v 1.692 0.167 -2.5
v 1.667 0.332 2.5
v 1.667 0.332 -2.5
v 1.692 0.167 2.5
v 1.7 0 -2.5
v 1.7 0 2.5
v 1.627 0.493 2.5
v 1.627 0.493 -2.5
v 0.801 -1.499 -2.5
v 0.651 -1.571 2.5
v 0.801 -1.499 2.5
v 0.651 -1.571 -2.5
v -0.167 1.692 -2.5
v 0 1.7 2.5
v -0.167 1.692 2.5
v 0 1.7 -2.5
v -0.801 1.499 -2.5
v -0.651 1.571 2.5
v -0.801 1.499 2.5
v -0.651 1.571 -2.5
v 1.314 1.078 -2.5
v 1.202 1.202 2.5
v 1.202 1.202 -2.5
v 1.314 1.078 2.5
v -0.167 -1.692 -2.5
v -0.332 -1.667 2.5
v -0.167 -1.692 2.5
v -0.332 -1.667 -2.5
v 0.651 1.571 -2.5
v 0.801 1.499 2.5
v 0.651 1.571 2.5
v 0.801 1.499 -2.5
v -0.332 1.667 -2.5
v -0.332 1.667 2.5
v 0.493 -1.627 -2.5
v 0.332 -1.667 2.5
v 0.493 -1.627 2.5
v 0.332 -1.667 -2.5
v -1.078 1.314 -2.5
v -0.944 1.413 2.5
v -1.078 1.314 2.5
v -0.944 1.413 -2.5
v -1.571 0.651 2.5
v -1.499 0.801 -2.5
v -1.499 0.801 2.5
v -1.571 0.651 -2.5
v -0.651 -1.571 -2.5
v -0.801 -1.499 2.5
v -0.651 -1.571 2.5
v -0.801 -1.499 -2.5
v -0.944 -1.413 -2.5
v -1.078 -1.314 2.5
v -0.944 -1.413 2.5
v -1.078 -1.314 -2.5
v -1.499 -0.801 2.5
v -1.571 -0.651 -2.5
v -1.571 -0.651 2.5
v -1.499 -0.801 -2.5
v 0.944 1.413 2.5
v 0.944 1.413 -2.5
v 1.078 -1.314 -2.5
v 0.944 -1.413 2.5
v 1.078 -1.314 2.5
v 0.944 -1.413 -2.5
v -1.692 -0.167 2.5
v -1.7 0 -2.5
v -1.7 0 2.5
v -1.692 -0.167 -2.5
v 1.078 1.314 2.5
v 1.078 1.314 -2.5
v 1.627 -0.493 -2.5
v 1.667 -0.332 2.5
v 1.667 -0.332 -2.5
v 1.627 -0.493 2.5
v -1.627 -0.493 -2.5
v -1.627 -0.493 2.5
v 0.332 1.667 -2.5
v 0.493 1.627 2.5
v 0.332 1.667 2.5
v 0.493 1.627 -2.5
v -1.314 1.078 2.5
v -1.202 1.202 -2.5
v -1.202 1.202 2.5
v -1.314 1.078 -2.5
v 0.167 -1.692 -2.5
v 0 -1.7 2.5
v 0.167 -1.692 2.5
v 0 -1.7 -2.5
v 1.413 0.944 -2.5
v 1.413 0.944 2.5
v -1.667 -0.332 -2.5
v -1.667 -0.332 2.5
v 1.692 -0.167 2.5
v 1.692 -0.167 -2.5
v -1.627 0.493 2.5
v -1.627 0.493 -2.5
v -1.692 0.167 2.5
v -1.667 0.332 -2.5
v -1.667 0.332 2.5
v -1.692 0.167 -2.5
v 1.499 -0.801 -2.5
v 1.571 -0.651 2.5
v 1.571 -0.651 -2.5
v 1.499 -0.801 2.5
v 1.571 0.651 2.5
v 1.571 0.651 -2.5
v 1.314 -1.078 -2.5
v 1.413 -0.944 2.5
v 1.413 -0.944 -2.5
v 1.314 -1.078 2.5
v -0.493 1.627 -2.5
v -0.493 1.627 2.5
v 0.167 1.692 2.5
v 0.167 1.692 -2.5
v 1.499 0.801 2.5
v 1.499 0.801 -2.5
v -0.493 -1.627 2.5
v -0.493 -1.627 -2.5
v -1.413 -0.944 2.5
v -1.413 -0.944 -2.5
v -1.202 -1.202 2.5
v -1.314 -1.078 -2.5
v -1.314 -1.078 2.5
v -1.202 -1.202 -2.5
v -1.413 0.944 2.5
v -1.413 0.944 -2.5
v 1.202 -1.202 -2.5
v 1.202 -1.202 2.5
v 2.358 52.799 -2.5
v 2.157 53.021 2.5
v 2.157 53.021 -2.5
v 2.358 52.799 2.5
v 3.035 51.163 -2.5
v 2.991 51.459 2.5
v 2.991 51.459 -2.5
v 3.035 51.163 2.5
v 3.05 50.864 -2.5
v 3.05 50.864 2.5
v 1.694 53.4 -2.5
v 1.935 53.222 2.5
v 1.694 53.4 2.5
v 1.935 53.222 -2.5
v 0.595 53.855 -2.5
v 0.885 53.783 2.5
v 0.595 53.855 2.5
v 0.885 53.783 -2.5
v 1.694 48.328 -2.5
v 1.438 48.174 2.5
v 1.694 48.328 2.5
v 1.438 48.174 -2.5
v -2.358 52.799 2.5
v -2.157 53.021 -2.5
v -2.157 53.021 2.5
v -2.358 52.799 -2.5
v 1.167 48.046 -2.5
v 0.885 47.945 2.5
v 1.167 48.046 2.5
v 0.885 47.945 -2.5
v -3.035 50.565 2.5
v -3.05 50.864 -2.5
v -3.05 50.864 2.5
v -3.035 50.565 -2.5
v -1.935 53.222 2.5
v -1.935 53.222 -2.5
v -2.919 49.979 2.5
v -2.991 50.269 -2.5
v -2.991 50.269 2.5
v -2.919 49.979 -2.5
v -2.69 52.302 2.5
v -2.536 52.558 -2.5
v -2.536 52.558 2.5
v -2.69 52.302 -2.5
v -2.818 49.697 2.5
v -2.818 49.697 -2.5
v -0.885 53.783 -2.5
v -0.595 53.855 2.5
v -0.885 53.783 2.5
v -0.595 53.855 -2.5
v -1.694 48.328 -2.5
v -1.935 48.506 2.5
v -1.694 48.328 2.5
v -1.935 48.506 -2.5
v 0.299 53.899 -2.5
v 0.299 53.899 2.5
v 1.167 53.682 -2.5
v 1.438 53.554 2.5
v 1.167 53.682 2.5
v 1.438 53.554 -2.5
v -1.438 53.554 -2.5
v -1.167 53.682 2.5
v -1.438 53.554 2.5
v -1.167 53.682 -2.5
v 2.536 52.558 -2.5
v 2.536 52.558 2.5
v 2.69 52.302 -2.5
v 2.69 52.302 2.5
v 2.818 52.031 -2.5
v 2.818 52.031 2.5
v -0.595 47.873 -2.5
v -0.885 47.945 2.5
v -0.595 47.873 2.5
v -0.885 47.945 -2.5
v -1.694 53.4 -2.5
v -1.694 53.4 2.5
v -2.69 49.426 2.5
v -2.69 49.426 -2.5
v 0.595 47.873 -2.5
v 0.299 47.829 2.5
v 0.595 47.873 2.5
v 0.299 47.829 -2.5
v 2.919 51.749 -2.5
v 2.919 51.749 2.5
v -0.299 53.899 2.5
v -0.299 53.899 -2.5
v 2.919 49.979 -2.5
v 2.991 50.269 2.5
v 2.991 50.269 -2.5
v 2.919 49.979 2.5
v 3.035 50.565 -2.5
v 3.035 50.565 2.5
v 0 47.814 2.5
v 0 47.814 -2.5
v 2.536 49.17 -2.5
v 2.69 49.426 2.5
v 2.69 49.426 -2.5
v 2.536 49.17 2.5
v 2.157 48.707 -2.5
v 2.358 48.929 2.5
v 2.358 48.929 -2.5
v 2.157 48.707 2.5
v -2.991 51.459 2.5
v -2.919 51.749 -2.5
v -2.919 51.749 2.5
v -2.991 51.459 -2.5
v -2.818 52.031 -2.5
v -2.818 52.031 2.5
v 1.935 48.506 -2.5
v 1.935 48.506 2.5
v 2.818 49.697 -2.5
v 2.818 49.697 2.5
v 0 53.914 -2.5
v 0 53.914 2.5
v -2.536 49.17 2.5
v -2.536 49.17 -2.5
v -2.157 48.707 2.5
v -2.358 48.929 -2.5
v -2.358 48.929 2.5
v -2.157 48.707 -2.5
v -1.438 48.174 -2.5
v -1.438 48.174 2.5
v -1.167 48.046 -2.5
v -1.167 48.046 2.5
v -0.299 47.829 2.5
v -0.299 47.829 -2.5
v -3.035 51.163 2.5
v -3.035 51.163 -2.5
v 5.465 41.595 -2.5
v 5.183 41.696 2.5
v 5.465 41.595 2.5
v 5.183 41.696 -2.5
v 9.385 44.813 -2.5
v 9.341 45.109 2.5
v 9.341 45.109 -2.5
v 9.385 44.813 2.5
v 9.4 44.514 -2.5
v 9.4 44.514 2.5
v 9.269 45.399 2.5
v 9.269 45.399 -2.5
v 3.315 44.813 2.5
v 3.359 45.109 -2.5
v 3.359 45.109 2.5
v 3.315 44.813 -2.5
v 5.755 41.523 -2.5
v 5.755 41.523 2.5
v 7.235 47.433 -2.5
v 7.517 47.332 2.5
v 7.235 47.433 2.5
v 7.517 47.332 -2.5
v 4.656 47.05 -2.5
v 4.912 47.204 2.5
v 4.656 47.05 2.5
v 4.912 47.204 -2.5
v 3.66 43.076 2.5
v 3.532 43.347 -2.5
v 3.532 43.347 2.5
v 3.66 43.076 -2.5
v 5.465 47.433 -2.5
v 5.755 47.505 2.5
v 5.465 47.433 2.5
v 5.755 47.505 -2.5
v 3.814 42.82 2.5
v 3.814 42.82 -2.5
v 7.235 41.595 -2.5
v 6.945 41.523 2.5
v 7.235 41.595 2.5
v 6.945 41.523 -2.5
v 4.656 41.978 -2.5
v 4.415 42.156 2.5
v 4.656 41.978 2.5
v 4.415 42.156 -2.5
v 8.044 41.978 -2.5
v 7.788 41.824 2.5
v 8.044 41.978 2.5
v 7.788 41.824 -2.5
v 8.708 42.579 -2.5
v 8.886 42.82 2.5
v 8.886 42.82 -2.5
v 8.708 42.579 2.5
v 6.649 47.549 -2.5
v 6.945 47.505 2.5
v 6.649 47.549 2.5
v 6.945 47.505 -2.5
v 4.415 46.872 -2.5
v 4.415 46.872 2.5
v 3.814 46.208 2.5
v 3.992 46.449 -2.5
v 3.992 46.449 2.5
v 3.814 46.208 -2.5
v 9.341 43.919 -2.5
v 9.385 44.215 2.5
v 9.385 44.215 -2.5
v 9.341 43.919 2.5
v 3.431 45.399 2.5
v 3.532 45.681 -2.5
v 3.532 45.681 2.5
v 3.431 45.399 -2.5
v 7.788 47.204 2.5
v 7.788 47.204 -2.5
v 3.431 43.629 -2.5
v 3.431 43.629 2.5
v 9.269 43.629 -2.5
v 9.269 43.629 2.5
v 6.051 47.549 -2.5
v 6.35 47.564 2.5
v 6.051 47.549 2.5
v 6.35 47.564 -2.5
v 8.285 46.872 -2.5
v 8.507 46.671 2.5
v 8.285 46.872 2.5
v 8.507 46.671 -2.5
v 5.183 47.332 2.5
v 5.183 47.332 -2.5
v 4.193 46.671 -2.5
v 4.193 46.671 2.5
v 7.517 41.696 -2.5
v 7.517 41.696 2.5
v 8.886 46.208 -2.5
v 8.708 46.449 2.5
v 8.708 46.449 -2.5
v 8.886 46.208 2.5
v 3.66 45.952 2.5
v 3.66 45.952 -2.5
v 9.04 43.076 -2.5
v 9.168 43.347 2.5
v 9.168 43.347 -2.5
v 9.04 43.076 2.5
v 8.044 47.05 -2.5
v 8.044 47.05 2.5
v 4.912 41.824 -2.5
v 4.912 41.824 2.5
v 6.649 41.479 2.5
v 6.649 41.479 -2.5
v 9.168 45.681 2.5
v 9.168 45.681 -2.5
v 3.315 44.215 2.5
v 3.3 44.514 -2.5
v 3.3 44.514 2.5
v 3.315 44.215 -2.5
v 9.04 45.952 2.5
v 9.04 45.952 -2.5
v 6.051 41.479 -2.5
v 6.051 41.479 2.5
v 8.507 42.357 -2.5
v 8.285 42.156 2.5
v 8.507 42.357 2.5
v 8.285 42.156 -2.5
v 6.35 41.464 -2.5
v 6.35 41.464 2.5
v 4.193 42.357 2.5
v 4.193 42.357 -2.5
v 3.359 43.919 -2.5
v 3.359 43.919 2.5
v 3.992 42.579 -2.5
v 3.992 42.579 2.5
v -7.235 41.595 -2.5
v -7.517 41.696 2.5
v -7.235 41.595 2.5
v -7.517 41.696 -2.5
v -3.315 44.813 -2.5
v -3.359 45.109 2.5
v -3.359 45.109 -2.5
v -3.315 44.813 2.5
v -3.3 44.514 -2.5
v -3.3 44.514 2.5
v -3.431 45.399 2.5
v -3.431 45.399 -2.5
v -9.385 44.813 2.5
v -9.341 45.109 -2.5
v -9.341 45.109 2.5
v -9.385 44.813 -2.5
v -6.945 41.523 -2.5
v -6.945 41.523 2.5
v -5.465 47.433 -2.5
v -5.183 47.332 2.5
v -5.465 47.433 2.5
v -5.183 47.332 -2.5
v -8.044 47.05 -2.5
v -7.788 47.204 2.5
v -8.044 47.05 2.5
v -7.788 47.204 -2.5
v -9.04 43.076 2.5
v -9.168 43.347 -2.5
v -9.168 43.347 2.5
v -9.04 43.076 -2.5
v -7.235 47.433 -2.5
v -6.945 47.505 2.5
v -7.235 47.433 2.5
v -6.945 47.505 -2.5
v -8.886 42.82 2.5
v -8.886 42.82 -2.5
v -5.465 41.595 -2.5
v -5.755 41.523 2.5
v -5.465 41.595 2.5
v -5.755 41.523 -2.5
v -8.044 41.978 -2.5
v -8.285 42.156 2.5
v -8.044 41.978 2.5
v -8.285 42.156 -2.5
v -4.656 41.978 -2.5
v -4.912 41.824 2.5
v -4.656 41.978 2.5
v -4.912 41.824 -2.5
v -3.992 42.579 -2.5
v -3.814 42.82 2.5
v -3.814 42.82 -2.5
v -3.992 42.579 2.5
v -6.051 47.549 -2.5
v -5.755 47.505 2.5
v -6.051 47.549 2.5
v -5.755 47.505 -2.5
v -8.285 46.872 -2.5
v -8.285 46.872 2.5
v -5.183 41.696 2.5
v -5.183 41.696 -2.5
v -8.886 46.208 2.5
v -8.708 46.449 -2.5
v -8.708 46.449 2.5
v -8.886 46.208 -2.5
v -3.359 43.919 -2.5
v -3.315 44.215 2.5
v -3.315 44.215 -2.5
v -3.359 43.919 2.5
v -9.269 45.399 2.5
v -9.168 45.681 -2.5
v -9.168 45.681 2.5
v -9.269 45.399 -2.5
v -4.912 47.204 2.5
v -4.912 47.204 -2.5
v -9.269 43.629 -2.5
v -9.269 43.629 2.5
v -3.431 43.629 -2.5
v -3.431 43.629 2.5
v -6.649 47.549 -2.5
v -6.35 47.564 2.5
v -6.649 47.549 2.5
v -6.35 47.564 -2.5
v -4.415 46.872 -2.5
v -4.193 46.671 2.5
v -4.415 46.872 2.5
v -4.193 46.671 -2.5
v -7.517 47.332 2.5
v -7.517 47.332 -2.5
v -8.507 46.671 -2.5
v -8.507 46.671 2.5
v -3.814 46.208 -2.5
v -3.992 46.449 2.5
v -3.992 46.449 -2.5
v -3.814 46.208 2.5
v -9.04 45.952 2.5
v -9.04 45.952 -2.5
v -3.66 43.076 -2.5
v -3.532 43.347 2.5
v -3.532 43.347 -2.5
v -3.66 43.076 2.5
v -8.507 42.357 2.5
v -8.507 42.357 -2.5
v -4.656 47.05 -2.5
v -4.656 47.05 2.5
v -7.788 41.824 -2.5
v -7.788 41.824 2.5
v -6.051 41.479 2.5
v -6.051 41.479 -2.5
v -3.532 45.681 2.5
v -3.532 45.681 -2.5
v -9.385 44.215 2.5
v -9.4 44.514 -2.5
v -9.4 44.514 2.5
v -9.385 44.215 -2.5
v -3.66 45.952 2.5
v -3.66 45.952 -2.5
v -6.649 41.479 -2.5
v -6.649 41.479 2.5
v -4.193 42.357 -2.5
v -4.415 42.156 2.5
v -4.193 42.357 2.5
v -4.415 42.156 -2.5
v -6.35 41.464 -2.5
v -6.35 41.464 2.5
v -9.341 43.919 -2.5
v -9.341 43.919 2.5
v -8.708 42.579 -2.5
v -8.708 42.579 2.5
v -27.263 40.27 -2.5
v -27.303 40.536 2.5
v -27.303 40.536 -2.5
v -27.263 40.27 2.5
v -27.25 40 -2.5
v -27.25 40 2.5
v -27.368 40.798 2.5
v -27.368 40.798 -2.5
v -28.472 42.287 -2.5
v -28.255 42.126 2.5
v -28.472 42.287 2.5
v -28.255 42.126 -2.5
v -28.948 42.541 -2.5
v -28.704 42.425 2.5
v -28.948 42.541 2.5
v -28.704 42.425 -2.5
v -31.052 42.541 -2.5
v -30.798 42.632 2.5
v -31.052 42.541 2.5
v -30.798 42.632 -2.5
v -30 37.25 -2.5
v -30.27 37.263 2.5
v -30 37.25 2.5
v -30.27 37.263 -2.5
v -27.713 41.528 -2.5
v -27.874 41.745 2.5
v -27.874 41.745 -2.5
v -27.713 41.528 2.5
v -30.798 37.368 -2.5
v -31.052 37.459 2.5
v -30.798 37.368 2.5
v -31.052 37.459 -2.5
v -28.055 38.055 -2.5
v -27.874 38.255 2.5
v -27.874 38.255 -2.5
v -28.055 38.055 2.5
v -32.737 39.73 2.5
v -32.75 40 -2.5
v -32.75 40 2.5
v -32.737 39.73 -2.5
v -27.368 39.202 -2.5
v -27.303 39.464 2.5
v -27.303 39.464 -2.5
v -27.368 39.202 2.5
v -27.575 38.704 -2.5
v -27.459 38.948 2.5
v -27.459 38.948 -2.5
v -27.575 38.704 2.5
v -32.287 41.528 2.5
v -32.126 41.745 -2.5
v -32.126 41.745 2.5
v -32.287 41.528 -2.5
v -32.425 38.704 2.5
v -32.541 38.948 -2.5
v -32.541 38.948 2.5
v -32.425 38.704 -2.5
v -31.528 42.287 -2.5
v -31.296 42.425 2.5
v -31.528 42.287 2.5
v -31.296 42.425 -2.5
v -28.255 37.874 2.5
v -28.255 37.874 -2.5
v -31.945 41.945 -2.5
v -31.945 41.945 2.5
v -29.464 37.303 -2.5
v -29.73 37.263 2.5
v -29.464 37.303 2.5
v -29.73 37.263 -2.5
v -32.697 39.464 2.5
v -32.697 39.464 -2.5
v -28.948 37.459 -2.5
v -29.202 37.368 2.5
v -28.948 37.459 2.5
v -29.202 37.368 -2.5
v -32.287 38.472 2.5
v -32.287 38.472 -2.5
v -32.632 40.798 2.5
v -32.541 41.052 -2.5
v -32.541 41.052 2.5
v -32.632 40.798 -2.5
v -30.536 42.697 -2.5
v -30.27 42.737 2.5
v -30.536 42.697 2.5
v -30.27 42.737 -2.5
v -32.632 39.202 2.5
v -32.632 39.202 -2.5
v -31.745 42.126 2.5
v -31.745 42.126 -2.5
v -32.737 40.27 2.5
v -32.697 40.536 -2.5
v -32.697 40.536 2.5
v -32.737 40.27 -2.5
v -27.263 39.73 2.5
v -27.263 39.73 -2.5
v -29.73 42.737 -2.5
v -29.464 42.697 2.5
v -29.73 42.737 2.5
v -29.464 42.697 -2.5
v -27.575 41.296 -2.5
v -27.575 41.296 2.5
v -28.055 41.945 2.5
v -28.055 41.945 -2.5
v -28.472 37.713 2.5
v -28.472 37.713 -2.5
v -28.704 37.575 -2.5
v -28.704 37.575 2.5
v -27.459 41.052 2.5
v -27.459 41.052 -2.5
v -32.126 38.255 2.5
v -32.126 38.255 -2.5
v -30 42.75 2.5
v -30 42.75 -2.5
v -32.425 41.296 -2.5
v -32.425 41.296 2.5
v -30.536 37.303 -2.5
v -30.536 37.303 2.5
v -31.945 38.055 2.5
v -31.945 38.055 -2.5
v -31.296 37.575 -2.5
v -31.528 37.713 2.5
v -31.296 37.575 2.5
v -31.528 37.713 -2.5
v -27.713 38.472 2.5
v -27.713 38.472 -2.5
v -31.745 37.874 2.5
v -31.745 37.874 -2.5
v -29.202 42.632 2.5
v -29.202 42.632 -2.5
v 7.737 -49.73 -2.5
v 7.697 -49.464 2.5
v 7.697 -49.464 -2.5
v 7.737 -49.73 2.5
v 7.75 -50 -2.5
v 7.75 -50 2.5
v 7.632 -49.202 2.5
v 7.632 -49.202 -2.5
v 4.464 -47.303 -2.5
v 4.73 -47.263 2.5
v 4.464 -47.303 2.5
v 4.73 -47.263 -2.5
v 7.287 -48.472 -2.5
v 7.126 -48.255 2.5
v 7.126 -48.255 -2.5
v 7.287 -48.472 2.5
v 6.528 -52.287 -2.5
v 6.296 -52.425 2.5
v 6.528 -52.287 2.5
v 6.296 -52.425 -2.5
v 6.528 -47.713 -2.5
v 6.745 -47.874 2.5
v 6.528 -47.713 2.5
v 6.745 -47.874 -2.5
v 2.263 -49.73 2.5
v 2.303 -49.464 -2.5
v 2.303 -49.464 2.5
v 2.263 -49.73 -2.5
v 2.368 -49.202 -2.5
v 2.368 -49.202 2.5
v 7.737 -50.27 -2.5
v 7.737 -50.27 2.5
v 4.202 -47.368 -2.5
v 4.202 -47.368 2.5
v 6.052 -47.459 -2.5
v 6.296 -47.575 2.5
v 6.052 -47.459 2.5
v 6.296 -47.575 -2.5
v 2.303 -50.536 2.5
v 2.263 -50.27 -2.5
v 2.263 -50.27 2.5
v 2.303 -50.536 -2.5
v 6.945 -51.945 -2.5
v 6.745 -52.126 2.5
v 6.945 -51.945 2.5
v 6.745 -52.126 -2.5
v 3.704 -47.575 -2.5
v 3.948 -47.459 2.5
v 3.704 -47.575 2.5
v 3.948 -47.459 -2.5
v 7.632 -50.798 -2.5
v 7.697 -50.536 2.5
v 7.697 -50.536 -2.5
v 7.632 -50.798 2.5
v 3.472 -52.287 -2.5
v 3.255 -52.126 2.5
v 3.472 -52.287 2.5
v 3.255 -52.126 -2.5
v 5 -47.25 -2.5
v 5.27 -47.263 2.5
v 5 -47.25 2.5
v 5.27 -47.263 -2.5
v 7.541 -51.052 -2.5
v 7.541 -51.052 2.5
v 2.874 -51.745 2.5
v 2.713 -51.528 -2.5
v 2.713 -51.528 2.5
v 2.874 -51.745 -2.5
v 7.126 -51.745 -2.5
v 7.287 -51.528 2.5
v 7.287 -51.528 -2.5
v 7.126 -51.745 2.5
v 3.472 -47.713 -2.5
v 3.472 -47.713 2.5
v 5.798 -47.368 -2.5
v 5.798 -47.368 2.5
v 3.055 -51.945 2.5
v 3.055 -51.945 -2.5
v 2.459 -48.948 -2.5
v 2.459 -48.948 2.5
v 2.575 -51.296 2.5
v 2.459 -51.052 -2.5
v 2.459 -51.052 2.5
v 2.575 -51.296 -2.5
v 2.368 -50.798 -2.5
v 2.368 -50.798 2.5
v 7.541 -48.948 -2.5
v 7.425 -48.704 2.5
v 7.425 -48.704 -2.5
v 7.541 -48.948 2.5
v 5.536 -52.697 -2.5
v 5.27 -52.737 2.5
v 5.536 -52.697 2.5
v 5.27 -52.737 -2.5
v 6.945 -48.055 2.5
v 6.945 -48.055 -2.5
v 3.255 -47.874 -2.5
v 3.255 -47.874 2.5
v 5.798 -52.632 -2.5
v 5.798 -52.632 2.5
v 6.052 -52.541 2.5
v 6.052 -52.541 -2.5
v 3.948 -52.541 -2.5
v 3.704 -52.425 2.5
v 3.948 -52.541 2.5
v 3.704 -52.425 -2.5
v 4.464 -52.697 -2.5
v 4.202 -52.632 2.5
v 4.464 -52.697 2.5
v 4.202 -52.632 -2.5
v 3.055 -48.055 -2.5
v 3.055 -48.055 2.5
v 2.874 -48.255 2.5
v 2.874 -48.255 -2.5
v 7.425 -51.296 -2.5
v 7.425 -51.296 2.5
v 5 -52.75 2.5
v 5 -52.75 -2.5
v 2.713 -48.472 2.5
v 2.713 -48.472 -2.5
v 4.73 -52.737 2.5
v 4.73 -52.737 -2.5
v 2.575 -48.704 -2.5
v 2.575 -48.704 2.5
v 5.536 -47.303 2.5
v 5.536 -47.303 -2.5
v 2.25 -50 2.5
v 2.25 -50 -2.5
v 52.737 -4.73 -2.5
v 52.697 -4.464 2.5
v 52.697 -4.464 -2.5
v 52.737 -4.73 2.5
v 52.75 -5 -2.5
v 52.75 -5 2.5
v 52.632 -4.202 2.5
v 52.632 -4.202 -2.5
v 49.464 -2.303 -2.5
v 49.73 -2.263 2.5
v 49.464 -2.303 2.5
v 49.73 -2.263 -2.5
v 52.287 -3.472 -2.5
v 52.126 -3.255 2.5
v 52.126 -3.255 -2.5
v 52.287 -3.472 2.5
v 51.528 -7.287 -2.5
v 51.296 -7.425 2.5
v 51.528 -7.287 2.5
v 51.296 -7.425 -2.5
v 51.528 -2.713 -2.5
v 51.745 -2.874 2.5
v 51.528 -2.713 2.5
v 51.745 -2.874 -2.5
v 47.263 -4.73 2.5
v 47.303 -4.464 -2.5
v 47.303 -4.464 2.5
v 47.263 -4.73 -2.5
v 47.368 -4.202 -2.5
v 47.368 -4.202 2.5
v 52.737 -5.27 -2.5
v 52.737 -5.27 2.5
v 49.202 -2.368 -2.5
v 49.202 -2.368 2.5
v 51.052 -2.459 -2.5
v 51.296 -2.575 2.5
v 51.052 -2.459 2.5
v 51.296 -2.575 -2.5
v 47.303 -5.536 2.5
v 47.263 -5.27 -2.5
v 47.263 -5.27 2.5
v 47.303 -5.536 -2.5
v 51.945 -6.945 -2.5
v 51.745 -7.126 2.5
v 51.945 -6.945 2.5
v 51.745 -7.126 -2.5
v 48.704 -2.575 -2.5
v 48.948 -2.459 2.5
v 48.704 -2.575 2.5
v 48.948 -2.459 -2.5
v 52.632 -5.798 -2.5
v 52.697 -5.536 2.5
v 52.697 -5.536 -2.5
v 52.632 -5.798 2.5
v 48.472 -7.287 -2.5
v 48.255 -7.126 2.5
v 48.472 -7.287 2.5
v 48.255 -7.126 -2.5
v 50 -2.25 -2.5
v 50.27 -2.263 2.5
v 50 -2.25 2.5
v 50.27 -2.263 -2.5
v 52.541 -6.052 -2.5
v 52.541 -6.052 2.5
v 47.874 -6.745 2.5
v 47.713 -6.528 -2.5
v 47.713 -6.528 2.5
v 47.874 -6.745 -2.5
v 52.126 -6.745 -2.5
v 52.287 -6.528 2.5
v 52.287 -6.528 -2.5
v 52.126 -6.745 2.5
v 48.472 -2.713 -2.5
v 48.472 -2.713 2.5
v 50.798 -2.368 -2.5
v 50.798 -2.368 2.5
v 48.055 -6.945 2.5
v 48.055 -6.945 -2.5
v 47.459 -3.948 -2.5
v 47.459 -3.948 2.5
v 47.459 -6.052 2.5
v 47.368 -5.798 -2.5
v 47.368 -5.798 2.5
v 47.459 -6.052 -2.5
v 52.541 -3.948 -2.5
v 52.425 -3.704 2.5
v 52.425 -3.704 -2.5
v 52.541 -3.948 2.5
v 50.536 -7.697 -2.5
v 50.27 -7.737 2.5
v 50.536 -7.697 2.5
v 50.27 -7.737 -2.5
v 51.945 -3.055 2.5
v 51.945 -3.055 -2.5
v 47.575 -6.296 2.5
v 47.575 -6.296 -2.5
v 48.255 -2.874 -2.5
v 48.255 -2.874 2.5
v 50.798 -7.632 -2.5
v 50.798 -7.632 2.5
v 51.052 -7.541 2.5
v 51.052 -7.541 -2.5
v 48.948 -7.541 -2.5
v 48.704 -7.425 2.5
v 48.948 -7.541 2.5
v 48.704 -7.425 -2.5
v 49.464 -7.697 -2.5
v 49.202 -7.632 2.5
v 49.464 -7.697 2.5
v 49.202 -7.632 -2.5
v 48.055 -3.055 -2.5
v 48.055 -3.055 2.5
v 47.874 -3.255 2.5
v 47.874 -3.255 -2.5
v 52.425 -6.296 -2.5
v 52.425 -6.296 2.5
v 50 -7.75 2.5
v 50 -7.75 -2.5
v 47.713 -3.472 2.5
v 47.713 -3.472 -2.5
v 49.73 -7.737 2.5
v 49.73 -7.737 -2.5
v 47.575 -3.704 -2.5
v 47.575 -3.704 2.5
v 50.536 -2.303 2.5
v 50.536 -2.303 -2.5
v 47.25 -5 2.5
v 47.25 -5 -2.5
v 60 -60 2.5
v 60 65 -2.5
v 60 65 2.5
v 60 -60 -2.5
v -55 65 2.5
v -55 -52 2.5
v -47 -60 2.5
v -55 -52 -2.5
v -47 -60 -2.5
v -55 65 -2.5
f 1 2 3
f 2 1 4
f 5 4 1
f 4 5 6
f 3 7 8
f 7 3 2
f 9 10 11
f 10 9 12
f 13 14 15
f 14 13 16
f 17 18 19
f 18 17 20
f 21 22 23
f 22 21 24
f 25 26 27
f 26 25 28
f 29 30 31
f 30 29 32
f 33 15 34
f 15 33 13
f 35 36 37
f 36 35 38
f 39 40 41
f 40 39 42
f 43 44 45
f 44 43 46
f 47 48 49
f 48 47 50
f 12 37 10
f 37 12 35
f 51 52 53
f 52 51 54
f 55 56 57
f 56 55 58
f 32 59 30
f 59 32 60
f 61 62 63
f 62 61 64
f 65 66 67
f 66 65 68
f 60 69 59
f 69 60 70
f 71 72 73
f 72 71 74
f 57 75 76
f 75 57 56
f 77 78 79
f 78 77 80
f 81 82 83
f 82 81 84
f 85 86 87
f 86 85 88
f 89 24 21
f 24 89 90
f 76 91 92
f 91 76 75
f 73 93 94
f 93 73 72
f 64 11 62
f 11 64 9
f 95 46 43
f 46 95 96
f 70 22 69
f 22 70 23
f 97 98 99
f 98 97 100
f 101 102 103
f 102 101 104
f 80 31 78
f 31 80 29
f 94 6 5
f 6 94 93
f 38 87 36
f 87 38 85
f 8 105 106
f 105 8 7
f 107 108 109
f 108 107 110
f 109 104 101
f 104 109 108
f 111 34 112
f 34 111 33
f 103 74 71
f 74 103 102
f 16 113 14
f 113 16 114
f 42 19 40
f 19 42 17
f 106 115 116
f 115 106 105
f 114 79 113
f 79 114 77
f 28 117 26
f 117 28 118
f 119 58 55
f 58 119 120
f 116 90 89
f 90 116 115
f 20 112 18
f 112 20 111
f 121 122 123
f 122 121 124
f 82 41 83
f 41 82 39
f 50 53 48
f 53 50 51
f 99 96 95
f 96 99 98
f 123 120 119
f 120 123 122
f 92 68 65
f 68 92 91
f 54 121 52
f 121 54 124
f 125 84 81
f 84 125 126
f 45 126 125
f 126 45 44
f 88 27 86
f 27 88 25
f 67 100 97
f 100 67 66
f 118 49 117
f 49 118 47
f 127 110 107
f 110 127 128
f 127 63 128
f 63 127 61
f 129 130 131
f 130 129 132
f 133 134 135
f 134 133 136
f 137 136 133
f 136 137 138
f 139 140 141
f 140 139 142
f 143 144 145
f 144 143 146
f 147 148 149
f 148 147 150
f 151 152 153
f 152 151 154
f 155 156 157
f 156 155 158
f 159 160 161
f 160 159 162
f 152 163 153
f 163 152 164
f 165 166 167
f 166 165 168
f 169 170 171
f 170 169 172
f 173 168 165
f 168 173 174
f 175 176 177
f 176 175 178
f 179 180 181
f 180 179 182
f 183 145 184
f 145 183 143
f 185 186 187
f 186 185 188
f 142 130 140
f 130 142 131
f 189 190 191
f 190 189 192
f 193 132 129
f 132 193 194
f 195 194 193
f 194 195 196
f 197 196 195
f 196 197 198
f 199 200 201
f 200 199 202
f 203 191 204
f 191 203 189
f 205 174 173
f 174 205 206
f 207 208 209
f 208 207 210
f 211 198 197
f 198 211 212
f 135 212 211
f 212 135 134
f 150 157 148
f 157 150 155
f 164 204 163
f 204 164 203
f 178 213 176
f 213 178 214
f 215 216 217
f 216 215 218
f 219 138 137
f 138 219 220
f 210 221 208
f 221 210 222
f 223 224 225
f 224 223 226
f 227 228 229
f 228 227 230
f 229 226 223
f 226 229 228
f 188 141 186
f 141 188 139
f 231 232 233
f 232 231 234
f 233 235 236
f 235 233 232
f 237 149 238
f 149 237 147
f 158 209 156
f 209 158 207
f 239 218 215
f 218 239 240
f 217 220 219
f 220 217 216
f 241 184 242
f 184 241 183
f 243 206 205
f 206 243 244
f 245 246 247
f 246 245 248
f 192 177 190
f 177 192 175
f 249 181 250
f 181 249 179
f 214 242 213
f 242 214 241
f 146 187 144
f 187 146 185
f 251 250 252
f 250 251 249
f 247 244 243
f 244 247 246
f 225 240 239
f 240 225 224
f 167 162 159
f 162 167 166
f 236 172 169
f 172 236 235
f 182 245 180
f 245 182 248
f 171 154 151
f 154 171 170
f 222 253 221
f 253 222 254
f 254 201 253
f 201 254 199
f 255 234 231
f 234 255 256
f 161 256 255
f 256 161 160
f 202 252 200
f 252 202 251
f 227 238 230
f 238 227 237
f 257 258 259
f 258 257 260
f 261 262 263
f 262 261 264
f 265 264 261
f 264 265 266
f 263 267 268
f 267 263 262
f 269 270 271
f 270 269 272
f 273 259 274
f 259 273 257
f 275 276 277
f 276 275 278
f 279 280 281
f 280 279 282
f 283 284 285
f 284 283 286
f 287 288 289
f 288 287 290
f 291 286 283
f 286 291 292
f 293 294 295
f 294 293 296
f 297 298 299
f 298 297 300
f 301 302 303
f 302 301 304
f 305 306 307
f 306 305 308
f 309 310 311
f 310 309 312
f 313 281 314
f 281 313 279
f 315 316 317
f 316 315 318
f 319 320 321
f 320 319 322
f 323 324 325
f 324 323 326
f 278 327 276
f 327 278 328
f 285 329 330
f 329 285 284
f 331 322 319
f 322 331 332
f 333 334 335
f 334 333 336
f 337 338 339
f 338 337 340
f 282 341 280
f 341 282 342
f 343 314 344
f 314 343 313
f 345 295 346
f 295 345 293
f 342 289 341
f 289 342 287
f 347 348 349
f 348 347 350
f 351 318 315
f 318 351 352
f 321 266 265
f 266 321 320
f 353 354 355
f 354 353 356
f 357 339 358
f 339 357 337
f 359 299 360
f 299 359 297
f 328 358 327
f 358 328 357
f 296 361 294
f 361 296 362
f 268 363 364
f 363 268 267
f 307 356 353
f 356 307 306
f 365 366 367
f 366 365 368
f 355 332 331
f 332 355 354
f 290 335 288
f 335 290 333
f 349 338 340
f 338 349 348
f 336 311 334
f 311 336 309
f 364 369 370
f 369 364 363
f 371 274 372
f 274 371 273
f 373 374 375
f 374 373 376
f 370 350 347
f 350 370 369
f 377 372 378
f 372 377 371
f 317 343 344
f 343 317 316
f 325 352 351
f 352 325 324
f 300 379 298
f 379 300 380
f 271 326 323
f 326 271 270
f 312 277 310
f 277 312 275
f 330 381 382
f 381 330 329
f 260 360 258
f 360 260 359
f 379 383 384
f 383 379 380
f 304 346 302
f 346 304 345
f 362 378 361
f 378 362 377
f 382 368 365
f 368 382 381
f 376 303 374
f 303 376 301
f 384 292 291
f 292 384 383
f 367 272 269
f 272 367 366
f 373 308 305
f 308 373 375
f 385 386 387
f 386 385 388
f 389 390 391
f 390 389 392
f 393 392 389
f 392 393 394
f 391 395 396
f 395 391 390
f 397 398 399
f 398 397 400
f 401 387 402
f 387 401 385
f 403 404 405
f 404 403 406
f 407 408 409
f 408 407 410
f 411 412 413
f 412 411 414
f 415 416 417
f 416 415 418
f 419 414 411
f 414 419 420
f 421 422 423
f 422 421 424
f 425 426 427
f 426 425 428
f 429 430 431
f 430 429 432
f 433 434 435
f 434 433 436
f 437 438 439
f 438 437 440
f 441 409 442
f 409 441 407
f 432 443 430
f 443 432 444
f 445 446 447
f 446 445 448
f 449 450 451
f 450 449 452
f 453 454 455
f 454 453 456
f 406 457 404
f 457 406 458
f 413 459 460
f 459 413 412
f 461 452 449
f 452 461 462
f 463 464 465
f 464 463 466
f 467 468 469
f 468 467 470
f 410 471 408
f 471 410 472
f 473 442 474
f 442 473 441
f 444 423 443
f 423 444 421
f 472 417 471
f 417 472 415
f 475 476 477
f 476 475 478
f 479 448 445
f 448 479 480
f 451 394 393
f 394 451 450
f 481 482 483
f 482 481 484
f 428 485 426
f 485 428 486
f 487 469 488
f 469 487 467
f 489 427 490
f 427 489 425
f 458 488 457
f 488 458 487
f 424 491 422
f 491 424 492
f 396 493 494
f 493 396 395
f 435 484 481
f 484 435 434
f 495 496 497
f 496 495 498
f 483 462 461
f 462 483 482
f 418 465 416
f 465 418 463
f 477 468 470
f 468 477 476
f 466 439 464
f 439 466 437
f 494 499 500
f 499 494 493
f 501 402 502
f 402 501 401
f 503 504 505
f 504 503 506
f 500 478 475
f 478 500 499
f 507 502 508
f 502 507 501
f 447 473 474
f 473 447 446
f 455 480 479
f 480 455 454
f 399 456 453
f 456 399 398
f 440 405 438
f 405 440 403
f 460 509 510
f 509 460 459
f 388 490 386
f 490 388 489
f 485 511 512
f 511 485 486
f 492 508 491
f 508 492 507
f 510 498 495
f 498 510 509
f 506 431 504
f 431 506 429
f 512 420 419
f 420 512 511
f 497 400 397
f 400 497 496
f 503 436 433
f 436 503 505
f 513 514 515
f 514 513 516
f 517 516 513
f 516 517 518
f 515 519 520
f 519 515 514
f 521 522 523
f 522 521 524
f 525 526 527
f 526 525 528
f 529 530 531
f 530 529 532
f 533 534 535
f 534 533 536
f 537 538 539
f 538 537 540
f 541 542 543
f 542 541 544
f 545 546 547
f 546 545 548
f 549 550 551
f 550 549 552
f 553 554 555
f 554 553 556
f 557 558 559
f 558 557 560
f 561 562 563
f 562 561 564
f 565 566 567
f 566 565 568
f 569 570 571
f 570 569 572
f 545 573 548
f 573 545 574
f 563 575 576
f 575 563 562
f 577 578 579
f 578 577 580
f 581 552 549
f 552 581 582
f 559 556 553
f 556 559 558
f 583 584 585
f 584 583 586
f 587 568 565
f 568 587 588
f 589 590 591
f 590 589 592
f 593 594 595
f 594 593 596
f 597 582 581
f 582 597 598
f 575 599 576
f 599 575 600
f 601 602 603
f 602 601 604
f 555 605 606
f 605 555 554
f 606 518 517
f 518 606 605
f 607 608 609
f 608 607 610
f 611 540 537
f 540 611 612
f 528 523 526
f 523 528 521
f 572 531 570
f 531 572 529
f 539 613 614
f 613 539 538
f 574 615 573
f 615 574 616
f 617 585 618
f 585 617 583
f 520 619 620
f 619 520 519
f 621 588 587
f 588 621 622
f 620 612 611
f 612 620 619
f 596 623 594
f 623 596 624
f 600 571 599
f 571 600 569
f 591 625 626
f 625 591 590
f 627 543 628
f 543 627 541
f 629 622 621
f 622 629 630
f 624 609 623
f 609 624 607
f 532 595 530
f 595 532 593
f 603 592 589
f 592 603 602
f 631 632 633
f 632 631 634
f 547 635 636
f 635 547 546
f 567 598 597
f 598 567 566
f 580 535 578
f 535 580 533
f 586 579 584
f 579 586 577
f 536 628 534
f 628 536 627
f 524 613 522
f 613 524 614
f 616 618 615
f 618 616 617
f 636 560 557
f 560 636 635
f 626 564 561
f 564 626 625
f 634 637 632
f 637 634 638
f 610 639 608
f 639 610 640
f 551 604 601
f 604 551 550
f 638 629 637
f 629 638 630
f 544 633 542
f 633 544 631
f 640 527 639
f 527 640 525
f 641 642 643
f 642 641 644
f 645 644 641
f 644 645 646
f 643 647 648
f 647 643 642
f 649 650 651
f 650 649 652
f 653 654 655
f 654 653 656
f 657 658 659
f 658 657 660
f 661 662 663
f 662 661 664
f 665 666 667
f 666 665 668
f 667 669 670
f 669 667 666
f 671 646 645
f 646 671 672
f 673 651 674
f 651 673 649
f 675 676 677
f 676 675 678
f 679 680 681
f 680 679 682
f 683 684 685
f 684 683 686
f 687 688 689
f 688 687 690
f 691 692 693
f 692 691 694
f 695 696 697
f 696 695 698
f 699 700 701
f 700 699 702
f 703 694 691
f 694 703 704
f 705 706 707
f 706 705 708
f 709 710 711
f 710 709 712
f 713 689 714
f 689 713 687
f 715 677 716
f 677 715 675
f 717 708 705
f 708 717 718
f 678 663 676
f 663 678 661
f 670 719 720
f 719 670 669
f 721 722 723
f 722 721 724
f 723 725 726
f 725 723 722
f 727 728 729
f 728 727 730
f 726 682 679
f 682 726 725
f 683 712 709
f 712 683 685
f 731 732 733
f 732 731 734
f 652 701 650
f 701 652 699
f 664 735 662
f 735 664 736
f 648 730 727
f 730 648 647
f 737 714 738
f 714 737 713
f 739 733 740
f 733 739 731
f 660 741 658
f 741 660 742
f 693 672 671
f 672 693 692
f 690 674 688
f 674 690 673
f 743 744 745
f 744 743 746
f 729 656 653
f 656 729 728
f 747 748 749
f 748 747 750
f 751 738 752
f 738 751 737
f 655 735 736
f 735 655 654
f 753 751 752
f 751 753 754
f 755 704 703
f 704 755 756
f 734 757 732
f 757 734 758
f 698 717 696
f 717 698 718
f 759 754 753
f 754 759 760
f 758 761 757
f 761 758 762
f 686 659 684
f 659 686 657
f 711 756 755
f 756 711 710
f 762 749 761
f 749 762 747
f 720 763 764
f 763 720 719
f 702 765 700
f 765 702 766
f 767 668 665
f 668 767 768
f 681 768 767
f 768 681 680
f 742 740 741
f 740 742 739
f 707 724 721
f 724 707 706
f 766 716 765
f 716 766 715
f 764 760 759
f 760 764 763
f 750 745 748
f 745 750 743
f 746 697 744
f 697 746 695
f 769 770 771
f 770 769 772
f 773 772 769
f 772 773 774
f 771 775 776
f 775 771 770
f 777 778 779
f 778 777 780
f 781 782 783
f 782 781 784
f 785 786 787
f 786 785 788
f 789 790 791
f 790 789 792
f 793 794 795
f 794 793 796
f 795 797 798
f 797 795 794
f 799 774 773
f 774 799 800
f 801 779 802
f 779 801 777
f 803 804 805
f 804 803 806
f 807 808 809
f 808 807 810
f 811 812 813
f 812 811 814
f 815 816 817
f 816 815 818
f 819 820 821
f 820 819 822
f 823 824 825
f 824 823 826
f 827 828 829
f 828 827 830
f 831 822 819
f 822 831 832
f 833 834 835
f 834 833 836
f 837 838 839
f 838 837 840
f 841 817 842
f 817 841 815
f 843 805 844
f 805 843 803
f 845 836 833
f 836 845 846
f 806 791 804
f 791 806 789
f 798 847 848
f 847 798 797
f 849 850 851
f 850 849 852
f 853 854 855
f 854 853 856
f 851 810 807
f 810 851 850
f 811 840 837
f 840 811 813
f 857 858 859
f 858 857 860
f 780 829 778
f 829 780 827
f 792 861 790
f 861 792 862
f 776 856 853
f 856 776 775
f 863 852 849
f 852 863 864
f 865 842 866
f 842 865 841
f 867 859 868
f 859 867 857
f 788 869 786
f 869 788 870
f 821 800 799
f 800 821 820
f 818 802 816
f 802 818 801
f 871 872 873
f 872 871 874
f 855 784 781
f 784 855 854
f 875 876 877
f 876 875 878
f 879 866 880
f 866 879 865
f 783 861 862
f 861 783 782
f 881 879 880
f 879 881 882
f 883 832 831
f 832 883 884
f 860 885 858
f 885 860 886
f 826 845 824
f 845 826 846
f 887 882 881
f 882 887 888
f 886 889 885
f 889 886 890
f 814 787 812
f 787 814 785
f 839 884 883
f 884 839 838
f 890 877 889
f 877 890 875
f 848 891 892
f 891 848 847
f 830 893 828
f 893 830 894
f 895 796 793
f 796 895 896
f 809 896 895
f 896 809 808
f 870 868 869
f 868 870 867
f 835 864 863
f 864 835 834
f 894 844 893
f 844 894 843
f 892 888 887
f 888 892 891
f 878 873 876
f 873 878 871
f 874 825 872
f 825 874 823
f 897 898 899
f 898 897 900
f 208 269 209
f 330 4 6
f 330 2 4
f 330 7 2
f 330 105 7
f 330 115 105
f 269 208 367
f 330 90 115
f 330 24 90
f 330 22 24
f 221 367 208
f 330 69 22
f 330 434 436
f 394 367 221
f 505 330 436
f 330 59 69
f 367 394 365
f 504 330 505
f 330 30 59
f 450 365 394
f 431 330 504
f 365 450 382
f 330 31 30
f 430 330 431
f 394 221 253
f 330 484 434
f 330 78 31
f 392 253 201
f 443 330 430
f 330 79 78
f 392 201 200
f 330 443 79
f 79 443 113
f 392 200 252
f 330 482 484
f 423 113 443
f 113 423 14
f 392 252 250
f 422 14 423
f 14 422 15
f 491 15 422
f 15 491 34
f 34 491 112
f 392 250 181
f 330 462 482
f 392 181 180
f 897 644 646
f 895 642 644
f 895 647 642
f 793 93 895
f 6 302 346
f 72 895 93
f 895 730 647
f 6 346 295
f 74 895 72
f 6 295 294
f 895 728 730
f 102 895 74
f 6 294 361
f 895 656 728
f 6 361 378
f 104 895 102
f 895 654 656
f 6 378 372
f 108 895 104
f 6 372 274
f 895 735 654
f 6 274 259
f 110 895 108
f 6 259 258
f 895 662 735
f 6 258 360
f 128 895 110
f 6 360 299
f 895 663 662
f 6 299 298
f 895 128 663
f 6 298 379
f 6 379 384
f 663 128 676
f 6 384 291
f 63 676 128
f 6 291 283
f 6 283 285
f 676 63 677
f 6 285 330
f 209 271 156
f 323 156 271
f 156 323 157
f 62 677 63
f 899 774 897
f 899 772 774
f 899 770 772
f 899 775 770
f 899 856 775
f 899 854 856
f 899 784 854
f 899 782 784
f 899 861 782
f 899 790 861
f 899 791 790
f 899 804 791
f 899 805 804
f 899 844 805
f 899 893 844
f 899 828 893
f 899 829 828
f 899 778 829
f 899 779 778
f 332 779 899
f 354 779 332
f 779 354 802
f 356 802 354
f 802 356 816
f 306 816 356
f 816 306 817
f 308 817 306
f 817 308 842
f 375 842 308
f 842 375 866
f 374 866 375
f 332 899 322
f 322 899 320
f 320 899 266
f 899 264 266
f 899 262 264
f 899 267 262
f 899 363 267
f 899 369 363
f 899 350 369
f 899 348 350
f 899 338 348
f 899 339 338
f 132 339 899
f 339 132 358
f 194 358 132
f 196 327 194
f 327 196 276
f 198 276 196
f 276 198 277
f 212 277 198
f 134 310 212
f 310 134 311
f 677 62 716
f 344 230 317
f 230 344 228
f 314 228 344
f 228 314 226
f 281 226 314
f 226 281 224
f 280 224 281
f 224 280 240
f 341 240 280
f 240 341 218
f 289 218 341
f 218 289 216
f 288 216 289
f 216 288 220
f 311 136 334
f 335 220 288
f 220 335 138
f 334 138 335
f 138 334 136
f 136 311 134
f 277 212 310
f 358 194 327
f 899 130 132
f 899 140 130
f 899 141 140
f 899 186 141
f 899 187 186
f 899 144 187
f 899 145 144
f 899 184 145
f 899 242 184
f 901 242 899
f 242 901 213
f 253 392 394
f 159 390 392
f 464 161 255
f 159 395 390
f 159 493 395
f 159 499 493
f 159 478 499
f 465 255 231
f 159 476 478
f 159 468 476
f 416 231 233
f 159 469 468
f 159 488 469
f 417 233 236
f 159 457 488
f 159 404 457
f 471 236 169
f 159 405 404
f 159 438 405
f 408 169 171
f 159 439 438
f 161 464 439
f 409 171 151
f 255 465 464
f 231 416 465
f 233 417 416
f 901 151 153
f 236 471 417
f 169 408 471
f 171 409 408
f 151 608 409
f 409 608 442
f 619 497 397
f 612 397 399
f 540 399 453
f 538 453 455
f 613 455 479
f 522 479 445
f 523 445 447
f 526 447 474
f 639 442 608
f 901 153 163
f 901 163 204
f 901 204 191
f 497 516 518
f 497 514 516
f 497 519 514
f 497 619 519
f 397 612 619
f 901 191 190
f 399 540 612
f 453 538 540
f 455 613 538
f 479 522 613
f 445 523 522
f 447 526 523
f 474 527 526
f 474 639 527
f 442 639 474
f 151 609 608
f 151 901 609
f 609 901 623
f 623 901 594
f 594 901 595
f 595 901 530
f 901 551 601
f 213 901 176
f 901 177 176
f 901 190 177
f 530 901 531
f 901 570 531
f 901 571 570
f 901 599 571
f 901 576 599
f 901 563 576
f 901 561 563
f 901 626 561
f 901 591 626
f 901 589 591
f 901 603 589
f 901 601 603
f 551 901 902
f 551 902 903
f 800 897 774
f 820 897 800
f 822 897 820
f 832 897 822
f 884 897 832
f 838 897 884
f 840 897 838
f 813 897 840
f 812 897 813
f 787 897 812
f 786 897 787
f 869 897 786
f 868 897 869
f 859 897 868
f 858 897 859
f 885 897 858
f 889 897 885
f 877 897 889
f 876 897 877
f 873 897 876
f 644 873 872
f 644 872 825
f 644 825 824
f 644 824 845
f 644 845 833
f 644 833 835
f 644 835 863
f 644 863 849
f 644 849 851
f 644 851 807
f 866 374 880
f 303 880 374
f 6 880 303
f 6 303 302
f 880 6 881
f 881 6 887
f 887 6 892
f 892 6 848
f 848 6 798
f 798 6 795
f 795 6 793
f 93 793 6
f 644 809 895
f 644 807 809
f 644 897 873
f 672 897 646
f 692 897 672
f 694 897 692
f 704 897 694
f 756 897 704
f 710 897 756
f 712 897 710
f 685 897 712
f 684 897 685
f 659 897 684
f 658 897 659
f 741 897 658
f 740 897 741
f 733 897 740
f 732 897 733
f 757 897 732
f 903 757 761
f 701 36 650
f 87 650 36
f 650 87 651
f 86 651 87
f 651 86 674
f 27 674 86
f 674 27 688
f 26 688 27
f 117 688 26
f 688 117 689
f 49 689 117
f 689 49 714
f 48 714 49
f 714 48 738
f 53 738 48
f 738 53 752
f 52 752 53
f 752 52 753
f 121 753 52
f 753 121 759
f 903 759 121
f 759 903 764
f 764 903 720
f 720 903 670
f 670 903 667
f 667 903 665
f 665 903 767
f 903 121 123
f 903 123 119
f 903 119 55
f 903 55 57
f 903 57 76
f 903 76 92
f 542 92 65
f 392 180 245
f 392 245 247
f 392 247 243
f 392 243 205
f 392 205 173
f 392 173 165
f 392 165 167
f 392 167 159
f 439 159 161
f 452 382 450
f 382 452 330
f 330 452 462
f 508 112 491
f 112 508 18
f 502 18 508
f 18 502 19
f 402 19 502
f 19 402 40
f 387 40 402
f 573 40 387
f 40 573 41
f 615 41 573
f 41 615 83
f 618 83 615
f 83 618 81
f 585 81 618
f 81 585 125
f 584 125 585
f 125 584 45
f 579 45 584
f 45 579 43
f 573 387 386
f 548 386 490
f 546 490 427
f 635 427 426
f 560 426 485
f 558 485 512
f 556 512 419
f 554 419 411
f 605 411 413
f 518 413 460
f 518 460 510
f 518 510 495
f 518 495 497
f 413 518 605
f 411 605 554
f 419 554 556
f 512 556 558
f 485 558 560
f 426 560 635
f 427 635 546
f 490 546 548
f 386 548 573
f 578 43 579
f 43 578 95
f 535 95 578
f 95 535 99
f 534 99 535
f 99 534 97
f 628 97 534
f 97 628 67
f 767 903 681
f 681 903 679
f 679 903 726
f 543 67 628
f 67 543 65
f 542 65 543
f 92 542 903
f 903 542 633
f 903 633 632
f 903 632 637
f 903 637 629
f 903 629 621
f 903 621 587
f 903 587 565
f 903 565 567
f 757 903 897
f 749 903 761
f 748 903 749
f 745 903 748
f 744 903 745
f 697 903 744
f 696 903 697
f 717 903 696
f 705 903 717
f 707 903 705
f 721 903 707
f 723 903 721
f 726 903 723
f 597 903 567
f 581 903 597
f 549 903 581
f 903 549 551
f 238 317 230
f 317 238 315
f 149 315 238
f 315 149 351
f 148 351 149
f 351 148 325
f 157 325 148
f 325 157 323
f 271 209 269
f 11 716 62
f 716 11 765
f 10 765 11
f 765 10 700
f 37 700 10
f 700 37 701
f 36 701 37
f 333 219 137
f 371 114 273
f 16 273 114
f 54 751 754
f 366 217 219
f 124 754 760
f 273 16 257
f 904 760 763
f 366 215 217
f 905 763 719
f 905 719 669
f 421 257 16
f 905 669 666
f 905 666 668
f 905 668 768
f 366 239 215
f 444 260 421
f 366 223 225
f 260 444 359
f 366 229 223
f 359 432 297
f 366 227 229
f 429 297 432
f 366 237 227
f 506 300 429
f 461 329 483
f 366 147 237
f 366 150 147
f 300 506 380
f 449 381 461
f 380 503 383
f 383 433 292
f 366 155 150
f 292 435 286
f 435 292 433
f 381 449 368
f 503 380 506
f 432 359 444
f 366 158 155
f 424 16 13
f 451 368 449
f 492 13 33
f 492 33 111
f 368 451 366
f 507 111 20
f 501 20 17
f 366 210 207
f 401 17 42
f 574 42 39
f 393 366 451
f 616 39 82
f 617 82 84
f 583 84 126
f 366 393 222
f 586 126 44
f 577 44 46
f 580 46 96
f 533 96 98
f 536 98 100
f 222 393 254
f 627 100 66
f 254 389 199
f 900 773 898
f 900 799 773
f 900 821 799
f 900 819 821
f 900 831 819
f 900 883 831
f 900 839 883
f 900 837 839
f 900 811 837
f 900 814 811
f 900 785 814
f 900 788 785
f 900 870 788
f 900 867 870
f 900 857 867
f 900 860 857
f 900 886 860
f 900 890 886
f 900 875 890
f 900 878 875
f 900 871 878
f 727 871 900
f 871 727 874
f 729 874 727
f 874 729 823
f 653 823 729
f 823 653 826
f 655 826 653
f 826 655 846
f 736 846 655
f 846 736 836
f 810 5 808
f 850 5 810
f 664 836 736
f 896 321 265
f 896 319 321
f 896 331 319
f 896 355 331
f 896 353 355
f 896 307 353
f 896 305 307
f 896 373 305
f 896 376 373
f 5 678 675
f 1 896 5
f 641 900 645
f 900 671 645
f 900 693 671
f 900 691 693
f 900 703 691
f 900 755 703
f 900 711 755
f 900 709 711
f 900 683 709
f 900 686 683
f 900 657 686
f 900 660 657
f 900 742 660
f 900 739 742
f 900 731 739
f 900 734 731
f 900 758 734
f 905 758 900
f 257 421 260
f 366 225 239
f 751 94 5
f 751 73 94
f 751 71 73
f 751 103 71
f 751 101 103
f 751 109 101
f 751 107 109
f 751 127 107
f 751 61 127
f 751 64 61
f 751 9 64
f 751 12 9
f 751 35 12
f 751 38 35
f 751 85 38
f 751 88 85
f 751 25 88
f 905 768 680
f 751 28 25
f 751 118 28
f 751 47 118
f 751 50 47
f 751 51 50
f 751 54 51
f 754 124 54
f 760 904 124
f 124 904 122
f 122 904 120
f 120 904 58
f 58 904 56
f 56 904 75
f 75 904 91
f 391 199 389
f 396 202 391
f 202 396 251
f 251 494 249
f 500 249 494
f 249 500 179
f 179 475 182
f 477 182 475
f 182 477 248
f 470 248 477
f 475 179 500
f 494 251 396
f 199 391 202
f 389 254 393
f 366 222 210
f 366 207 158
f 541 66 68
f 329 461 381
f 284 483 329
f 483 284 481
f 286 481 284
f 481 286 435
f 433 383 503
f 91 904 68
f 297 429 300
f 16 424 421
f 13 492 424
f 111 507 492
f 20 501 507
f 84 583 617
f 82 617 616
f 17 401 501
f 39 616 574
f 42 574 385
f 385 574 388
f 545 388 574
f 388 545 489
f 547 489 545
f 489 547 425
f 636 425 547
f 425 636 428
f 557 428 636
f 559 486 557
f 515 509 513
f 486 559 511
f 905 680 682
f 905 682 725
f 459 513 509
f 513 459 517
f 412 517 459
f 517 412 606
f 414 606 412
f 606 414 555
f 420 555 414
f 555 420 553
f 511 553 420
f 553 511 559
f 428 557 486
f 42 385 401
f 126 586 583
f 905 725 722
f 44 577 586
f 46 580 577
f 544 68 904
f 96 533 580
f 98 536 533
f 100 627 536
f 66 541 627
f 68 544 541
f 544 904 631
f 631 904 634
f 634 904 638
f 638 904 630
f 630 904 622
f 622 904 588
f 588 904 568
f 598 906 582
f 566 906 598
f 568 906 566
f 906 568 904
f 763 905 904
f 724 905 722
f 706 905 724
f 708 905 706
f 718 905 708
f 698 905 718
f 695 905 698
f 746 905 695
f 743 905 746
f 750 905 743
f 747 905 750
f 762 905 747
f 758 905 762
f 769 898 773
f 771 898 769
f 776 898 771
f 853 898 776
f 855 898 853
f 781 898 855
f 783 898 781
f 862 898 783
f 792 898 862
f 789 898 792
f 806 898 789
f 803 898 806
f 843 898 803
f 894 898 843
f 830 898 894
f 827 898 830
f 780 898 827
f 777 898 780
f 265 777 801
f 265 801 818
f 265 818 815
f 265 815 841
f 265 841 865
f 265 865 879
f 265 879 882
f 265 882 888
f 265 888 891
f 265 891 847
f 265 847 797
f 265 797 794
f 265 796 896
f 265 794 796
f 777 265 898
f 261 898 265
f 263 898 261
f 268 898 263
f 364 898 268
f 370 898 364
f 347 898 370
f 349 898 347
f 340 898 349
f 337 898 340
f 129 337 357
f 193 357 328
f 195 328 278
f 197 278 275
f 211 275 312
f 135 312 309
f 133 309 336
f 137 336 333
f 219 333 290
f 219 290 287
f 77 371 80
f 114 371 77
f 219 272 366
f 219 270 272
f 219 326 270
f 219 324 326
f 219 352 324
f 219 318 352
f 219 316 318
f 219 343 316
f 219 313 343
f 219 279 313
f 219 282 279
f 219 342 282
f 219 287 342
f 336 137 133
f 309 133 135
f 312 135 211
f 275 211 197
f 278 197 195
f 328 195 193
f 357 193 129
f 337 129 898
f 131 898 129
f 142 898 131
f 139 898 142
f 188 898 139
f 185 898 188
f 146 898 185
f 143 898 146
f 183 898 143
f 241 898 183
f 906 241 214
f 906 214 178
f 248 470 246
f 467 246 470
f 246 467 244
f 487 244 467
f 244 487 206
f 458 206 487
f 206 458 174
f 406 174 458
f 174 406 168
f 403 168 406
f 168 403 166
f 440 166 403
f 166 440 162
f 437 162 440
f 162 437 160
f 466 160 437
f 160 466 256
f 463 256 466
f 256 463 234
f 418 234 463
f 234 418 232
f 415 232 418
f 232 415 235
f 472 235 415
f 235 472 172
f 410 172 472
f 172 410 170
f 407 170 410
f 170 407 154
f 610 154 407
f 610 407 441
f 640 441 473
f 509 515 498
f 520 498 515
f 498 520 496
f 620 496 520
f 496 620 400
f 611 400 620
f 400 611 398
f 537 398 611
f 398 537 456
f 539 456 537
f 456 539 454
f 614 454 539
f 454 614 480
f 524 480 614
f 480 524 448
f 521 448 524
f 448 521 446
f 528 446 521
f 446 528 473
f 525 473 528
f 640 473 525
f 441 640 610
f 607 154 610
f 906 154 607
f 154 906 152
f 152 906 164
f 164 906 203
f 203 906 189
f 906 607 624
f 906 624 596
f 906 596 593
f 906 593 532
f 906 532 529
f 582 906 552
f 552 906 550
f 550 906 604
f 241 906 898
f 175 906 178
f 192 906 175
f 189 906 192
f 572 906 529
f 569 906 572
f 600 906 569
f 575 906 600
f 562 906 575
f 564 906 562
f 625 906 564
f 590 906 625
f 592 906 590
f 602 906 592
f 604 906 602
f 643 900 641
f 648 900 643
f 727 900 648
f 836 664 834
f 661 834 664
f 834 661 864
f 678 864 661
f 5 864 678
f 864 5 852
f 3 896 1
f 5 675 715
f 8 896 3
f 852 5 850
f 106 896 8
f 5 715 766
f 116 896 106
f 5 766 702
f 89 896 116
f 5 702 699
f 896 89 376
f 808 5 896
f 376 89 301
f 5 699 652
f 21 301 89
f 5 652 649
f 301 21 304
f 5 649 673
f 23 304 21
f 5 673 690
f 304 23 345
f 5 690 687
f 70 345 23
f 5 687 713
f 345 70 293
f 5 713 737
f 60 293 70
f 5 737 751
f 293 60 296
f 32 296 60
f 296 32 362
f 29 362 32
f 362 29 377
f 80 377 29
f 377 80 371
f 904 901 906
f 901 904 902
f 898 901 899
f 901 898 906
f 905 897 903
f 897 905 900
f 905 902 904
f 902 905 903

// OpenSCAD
// Carvera Air fixture plate
// Replaces acrylic jig + MDF sacrificial board
// Origin (0,0,0) = workpiece center = CNC machine X0 Y0, top surface
//
// Bolt this to the Carvera Air bed using the three mounting holes.
// Then probe the center registration hole to set X0 Y0 for each session.
//
// Mounting holes correspond to Carvera Air bed holes (in bed coordinates):
//   (45, 120), (80, 30), (125, 75)
// ...assuming workpiece center at bed position (75, 80).
// If you position the plate differently on the bed, update mount_holes below.
//
// Carvera Air bed holes are M5 threaded. The STEP model shows 6mm circles
// at 2mm depth — these appear to be the bosses/standoffs around the M5 holes,
// not the holes themselves. The 4mm dowel pin locations are not modeled in
// the simplified STEP file.
//
// Print flat (largest face down). No supports needed.

// ----- Parameters -----

plate_t   = 5;     // plate thickness (mm)
tolerance = 0.1;   // added to registration hole diameters for FDM shrinkage
                   // increase toward 0.2 if holes print tight

// Plate extents relative to workpiece center (0,0)
x_min = -55;
x_max =  60;
y_min = -60;
y_max =  65;

// Work registration holes [x, y, nominal_diameter]
work_holes = [
    [  0.000,  0.000, 3.3],  // center — M3 clevis pin
    [  0.000, 50.864, 6.0],  // tab top center
    [  6.350, 44.514, 6.0],  // tab right
    [ -6.350, 44.514, 6.0],  // tab left
];

// Bed mounting holes [x, y] relative to workpiece center
mount_holes = [
    [-30,  40],   // bed hole (45, 120)
    [  5, -50],   // bed hole (80,  30)
    [ 50,  -5],   // bed hole (125, 75)
];
mount_d = 5.5;   // M5 clearance (Carvera Air bed is M5 threaded)

// ----- Geometry -----

$fn = 64;

// punch a hole all the way through the plate at the current origin
module thru(d, sides = 0) {
    translate([0, 0, -(plate_t / 2 + 1)])
        cylinder(d = d, h = plate_t + 2, $fn = sides > 0 ? sides : $fn);
}

difference() {
    // plate body, centered on Z=0
    translate([(x_min + x_max) / 2, (y_min + y_max) / 2, 0])
        cube([x_max - x_min, y_max - y_min, plate_t], center = true);

    // work registration holes
    for (h = work_holes)
        translate([h[0], h[1], 0])
            thru(h[2] + tolerance);

    // bed mounting holes
    for (h = mount_holes)
        translate([h[0], h[1], 0])
            thru(mount_d);

    // orientation notch at bottom-left corner — makes plate asymmetric
    // so you can't bolt it down rotated 180°
    translate([x_min, y_min, 0])
        thru(16, sides = 4);
}
